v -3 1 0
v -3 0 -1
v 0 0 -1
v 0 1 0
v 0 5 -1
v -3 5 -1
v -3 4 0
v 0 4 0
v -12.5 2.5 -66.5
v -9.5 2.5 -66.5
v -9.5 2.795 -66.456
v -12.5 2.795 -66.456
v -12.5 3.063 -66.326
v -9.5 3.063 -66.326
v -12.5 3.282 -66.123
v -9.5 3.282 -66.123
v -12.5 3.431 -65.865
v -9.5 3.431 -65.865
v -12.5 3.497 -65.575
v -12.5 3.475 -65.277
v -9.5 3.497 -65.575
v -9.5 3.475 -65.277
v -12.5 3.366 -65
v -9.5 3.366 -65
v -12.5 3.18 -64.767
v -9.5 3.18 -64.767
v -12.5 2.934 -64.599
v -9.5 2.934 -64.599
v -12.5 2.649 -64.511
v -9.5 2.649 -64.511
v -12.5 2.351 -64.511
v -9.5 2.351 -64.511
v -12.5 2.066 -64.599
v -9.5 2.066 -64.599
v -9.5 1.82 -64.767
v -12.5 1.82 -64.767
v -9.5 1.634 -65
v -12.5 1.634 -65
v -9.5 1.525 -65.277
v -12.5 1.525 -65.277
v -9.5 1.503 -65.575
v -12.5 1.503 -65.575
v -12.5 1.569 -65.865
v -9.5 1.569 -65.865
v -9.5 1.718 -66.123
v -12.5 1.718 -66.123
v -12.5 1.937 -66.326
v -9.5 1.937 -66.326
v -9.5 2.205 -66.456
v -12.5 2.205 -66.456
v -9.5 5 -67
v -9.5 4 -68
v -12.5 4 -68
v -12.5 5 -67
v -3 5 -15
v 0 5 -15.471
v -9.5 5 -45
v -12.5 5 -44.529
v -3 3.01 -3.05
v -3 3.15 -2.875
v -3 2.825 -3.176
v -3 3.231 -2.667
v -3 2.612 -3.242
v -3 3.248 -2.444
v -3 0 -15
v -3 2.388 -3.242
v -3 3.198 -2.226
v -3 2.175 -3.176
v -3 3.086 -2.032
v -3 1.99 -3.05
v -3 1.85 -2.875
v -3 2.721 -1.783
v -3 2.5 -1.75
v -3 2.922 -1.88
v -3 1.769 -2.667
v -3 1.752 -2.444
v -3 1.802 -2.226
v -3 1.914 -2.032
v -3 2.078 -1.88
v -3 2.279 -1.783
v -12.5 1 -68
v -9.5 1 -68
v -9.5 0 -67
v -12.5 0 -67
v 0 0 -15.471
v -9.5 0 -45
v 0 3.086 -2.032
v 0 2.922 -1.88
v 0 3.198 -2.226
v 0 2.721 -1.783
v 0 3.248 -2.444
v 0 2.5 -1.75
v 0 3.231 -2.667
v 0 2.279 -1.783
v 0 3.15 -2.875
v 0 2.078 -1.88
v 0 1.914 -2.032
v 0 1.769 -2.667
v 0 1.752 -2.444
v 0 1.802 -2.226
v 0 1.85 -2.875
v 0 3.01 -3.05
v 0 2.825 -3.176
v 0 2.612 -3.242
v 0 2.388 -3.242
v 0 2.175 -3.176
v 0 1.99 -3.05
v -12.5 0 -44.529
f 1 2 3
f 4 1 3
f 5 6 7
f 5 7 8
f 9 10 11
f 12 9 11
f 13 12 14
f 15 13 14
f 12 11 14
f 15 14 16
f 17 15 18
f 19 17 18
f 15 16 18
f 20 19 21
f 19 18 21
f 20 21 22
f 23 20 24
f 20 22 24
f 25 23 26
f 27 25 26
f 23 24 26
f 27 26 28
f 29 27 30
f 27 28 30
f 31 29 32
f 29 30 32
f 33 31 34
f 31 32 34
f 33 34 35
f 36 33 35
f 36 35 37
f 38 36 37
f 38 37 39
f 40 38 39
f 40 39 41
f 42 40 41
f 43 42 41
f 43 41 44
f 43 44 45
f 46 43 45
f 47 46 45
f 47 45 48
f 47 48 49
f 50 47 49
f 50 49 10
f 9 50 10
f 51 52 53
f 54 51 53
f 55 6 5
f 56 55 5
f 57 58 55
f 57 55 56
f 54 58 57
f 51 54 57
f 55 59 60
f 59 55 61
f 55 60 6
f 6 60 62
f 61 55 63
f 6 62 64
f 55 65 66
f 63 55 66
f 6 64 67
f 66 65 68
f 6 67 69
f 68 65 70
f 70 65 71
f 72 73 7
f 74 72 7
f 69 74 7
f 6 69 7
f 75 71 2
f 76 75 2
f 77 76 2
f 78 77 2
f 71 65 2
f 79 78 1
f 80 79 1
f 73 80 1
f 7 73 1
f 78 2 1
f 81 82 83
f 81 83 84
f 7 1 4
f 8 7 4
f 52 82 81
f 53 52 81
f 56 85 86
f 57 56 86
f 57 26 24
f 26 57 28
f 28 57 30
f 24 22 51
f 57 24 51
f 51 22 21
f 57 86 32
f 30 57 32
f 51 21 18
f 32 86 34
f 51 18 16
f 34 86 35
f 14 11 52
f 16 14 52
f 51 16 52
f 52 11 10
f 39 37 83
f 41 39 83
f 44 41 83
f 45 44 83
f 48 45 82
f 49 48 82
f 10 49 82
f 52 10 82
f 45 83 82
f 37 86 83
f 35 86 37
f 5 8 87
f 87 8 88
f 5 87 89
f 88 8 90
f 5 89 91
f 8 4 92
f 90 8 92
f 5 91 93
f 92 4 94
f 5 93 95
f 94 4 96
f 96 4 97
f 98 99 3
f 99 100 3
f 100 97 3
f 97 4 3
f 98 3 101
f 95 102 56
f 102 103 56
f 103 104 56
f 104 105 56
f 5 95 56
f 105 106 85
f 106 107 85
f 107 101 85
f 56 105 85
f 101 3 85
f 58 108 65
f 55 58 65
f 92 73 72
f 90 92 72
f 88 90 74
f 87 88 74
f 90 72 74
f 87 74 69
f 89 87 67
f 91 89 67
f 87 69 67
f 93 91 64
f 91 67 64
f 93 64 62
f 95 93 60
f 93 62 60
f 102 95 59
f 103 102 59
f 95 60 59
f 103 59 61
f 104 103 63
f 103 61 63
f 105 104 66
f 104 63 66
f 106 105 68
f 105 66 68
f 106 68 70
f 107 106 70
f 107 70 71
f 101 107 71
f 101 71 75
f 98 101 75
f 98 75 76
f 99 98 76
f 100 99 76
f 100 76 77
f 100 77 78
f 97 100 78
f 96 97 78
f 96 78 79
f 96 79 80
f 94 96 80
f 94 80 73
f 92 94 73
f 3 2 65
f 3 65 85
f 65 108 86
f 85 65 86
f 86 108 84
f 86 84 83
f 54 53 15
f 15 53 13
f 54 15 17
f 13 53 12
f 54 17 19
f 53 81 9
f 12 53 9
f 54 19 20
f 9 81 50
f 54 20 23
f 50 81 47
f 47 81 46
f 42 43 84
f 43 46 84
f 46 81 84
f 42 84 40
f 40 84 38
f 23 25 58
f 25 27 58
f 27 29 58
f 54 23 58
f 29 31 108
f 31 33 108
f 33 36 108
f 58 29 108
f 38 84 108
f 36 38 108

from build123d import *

# Parameters (mm, degrees)
BOSS_EXTRUDE1_DEPTH = 5
SKETCH3_R           = 0.75
CUT_EXTRUDE1_DEPTH  = 4
SKETCH4_R           = 1
CUT_EXTRUDE2_DEPTH  = 4
CHAMFER1_SIZE       = 1


with BuildPart() as part:
    # Sketch2 → Boss-Extrude1 (new body)
    with BuildSketch(Plane(origin=(0, 0, 0), x_dir=(1, 0, 0), z_dir=(0, 1, 0))):
        Polygon((0, 0), (0, 15.470692064), (-9.5, 45), (-9.5, 68), (-12.5, 68), (-12.5, 44.529307936), (-3, 15), (-3, 0), align=None)
    extrude(amount=BOSS_EXTRUDE1_DEPTH)

    # Sketch3 → Cut-Extrude1 (cut, through all)
    with BuildSketch(Plane.ZY.offset(3)):
        with Locations((-2.5, 2.5)):
            Circle(SKETCH3_R)
    extrude(amount=-CUT_EXTRUDE1_DEPTH, mode=Mode.SUBTRACT)

    # Sketch4 → Cut-Extrude2 (cut, through all)
    with BuildSketch(Plane(origin=(-9.5, 0, 0), x_dir=(0, 0, -1), z_dir=(1, 0, 0))):
        with Locations((65.5, 2.5)):
            Circle(SKETCH4_R)
    extrude(amount=-CUT_EXTRUDE2_DEPTH, mode=Mode.SUBTRACT)

    # Chamfer1
    chamfer1_edges = [part.edges().sort_by_distance(p)[0] for p in [
        (-1.5, 0, 0),
        (-11, 5, -68),
        (-1.5, 5, 0),
        (-11, 0, -68),
    ]]
    chamfer(chamfer1_edges, length=CHAMFER1_SIZE)


solid = part.part
